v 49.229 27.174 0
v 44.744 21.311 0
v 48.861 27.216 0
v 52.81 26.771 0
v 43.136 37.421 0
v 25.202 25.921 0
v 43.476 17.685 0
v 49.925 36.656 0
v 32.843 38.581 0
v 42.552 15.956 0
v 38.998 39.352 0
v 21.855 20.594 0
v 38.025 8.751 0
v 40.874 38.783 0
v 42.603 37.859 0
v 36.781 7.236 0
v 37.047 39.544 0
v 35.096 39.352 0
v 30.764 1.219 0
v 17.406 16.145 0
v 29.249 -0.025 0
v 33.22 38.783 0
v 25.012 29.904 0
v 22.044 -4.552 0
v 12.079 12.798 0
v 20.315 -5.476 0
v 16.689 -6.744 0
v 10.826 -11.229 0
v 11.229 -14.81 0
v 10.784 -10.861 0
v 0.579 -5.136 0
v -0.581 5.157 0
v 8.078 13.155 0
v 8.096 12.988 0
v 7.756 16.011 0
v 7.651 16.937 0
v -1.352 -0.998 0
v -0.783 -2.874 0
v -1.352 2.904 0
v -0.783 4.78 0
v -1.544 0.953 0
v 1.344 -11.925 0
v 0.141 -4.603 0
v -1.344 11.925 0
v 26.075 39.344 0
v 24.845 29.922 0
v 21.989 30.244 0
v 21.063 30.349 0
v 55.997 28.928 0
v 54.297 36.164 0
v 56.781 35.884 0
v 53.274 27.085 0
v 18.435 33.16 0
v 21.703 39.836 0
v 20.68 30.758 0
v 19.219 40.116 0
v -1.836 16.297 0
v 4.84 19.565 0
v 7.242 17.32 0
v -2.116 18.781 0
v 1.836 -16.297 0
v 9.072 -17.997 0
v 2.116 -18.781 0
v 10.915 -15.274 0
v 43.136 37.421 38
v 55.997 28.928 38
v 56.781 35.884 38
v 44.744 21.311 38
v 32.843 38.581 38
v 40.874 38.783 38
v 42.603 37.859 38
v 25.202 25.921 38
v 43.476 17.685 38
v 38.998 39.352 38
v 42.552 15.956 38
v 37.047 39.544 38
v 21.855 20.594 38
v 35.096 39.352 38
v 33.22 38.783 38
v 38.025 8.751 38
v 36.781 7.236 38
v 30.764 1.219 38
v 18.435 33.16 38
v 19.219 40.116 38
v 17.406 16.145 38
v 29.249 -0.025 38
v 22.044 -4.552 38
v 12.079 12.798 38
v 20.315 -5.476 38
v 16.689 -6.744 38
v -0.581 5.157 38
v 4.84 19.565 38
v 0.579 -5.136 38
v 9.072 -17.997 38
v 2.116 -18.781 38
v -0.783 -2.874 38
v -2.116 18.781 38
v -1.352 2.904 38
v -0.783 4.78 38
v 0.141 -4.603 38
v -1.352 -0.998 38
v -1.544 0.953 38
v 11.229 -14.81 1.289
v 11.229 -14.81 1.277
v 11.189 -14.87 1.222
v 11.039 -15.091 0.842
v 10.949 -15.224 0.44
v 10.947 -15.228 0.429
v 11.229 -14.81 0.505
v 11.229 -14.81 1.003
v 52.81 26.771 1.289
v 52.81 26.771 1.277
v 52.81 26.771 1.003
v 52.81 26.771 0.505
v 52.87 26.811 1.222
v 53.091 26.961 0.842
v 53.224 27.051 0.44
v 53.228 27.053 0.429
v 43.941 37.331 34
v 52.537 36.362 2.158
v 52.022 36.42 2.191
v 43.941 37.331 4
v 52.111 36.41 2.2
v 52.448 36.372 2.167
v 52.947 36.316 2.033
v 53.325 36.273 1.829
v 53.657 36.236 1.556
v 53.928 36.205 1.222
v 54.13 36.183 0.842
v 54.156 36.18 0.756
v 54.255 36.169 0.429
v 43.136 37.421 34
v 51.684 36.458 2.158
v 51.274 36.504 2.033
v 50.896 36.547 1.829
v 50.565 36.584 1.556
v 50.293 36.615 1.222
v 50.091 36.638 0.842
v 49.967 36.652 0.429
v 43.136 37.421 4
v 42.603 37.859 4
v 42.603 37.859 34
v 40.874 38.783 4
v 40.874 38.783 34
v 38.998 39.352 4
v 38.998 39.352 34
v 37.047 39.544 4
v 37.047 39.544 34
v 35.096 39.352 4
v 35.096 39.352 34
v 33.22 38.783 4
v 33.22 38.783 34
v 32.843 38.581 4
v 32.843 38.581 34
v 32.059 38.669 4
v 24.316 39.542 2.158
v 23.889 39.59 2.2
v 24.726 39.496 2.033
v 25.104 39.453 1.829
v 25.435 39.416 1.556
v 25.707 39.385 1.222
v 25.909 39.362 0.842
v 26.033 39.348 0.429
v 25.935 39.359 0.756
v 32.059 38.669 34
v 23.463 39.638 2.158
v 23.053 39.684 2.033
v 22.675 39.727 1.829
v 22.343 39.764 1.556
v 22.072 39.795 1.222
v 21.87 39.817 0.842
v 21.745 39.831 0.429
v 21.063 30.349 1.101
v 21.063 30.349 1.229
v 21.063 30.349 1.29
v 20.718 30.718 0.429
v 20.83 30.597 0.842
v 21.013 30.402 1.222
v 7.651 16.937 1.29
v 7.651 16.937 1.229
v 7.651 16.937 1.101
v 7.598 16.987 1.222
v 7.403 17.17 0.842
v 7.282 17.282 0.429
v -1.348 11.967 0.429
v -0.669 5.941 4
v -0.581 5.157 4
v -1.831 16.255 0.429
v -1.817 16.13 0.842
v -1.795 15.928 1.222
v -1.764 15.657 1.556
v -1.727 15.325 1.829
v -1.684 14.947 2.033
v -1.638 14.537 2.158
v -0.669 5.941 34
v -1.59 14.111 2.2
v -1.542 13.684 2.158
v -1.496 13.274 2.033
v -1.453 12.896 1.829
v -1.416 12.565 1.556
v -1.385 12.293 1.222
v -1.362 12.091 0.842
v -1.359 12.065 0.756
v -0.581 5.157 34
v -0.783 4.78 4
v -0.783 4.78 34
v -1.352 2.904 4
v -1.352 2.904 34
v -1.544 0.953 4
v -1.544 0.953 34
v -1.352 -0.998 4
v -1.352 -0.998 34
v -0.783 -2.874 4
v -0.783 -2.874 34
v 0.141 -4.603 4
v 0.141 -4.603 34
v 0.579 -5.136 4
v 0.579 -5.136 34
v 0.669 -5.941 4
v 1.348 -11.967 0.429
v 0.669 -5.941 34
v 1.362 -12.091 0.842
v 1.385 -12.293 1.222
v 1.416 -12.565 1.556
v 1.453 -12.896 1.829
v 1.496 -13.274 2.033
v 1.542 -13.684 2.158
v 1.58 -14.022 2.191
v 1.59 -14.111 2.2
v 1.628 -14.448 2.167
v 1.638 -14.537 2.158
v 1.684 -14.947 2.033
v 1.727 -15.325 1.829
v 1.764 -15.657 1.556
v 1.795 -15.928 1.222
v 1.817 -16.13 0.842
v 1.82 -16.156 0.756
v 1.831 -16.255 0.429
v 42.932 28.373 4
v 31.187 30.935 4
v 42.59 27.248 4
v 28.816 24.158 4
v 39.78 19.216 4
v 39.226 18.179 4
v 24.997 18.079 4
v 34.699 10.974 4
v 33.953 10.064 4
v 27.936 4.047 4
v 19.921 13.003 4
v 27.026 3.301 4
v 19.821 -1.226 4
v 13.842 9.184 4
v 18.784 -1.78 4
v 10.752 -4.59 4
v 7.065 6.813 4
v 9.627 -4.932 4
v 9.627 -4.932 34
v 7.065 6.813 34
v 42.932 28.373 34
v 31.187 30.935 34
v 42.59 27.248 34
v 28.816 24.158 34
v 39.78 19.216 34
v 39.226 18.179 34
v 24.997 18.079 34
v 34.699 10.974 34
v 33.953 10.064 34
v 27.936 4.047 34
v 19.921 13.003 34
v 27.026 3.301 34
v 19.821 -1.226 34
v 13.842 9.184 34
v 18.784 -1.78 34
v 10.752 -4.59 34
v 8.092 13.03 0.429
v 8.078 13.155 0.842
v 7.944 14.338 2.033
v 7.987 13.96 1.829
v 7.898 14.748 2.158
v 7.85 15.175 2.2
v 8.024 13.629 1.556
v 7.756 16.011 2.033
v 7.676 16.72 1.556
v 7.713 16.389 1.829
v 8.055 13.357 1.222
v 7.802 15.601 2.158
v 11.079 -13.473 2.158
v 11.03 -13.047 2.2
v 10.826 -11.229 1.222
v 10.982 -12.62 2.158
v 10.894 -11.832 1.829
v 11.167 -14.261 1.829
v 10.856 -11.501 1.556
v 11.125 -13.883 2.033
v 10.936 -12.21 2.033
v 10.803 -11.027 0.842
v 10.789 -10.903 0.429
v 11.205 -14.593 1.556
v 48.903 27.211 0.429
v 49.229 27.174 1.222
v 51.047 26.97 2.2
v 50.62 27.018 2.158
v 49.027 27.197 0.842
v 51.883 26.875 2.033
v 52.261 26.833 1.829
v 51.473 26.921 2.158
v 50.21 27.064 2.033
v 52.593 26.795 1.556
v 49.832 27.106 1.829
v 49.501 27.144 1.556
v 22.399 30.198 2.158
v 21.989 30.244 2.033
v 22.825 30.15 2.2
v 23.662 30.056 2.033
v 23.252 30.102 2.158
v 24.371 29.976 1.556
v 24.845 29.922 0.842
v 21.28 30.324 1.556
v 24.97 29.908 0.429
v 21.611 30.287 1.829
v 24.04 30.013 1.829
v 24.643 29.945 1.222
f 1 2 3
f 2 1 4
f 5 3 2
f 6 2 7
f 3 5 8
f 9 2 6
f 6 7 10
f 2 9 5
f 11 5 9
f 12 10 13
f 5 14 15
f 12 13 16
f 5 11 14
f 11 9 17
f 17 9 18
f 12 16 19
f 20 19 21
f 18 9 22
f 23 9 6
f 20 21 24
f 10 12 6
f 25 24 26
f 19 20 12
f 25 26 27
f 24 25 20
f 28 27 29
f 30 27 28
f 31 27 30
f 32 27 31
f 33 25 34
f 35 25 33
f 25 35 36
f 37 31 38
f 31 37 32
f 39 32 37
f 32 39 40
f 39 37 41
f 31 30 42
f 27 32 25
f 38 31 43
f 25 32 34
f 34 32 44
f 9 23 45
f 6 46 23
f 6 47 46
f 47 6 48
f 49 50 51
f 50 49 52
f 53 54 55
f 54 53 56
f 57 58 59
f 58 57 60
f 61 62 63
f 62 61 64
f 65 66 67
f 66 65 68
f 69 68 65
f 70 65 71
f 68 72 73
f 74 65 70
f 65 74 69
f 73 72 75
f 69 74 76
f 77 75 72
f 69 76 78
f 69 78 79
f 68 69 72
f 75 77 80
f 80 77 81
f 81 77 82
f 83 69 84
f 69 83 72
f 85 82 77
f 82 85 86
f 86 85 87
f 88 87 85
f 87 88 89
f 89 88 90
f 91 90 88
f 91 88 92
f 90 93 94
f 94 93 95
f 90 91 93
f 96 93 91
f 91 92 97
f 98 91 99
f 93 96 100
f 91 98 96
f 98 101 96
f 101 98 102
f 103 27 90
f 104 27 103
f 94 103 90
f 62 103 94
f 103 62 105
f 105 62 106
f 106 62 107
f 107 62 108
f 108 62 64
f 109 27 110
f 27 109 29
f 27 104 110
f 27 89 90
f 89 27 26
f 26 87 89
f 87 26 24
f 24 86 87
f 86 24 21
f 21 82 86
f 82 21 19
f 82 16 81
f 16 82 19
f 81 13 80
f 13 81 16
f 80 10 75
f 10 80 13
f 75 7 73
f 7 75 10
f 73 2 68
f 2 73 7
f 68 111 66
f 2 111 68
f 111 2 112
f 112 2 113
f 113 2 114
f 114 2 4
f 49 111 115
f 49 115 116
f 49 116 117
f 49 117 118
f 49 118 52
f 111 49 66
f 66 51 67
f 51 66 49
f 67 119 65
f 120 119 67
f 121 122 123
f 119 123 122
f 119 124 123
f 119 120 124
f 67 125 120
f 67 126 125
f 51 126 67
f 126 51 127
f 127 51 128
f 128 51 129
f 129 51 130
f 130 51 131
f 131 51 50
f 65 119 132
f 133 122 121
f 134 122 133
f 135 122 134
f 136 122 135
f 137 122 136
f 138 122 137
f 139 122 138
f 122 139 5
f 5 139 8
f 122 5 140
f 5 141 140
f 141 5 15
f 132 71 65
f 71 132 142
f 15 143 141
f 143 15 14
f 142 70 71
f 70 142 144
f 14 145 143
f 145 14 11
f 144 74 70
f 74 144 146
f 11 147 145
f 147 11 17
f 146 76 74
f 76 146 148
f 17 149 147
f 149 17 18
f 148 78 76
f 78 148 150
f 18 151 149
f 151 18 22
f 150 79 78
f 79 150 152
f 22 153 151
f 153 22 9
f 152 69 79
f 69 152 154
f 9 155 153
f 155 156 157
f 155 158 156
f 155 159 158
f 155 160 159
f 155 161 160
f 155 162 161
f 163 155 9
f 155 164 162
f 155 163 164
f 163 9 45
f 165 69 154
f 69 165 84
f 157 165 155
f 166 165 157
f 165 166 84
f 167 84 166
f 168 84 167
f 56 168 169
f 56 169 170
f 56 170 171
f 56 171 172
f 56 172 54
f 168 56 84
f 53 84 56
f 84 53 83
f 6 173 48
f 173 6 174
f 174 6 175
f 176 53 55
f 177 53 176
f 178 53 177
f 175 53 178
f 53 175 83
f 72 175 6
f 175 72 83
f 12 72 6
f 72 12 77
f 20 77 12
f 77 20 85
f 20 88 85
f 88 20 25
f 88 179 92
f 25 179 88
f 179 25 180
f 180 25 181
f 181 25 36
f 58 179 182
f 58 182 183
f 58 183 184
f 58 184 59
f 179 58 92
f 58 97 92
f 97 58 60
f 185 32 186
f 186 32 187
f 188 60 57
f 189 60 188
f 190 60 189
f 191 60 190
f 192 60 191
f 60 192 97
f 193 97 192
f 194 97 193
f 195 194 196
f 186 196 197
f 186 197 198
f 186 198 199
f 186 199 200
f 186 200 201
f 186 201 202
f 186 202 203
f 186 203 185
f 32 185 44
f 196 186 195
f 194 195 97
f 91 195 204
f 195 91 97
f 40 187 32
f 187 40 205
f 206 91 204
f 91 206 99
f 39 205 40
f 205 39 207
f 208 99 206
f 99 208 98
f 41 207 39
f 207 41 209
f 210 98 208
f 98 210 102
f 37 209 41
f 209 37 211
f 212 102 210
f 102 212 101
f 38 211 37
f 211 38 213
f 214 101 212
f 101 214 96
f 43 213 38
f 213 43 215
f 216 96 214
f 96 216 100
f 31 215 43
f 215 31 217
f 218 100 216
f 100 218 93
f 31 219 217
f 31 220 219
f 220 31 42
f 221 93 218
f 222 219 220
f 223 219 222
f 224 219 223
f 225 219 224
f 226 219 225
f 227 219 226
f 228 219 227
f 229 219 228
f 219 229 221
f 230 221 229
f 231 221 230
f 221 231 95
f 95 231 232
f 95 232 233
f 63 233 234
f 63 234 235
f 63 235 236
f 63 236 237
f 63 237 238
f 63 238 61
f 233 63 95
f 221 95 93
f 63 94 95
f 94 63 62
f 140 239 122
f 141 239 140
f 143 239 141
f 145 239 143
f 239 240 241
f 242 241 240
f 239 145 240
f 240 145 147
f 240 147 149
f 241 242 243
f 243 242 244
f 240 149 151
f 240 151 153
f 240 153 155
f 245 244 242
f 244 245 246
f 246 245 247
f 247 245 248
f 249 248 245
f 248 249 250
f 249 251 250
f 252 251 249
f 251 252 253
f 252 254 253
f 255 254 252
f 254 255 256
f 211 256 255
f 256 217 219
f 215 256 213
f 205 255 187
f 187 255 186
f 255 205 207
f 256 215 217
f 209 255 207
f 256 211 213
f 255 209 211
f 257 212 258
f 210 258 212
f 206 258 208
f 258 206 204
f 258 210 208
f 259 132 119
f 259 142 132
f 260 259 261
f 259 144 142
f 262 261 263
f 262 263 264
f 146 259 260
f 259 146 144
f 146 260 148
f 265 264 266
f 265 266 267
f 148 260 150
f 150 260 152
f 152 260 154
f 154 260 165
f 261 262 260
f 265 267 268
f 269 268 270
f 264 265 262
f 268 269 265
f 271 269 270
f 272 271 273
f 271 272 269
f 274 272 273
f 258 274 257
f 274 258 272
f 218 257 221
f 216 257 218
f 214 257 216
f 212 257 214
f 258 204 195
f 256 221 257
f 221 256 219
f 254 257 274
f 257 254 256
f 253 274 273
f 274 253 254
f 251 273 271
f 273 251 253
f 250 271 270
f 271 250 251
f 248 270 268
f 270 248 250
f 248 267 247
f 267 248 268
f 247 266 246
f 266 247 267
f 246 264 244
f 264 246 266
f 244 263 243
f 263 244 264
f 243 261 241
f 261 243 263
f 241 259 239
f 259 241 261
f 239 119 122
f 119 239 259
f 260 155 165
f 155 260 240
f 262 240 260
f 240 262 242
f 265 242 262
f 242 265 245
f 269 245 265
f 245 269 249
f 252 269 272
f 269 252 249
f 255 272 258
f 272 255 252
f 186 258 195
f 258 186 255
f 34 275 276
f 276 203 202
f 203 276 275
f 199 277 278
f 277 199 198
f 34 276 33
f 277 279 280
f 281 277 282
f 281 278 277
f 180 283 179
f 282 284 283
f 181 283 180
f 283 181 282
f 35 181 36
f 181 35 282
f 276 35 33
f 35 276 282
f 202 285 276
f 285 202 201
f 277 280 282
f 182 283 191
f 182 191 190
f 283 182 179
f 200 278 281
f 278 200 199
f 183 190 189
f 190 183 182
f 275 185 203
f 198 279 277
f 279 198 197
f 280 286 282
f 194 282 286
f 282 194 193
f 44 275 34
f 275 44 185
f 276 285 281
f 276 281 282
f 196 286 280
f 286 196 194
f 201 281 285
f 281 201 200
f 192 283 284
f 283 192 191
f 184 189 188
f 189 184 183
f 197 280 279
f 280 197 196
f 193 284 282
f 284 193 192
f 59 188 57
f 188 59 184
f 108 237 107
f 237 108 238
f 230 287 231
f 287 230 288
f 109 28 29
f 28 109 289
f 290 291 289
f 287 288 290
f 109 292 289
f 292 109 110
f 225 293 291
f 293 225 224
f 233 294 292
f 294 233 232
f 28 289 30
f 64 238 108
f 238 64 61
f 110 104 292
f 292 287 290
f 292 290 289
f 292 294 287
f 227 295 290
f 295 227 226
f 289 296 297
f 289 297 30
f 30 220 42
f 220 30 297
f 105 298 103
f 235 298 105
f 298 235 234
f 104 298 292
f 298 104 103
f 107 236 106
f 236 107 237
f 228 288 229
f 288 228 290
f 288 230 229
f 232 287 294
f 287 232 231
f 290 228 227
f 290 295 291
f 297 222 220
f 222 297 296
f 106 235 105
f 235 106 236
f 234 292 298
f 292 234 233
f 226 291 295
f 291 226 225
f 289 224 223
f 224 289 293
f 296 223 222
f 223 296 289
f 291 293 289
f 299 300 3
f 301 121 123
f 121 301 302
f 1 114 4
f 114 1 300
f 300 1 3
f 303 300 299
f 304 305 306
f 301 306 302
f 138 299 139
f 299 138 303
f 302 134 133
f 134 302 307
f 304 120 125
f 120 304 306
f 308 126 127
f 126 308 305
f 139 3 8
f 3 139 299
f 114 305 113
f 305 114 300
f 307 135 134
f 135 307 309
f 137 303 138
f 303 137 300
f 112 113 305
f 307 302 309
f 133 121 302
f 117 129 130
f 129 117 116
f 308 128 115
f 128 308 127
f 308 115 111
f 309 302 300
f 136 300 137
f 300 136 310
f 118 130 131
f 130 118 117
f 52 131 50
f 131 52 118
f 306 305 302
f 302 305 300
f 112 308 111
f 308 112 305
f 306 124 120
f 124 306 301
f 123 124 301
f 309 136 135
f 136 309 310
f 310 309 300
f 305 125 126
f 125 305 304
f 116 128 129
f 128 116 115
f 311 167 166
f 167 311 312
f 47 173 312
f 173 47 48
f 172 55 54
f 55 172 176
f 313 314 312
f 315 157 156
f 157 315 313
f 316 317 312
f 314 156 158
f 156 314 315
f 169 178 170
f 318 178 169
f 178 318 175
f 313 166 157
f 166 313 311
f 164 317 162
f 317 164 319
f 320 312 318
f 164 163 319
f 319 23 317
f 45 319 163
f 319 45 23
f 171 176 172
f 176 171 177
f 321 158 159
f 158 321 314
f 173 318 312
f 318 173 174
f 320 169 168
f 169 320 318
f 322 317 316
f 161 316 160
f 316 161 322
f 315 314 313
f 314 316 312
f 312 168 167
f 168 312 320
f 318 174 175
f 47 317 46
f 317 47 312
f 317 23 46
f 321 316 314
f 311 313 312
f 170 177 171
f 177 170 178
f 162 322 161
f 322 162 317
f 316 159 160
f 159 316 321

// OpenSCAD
$fn = 32;

// ----------------------------------------------------------------------
// Air duct: 20 mm duct, 4 mm wall, 38 mm across
// ----------------------------------------------------------------------

// --- parameters (mm) ---
duct_r = 10;              // duct core radius
duct_d = 20;              // duct core diameter
wall = 4;                 // duct wall thickness
height = 38;              // duct width (extrusion height)
port_r = 18.9;            // port flange half width
port_d = 37.8;            // port flange width
port_t = 7;               // port flange thickness
bolt_d = 4.4;             // port bolt holes
bolt_offset = 14.2;       // bolt hole offset from the port axis

difference() {
  /* outer hull chain: tube with a flat flange plate at every port */
  linear_extrude(height = 38) {
    hull() {
      polygon([[2.116, -18.781], [-2.116, 18.781], [4.84, 19.565], [9.072, -17.997]]);
      translate([9.937, 1.12]) circle(r = 10);
    }
    hull() {
      translate([9.937, 1.12]) circle(r = 10);
      translate([8.456, 0.953]) circle(r = 10);
    }
    hull() {
      translate([8.456, 0.953]) circle(r = 10);
      translate([16.488, 3.763]) circle(r = 10);
    }
    hull() {
      translate([16.488, 3.763]) circle(r = 10);
      translate([23.693, 8.29]) circle(r = 10);
    }
    hull() {
      translate([23.693, 8.29]) circle(r = 10);
      translate([29.71, 14.307]) circle(r = 10);
    }
    hull() {
      translate([29.71, 14.307]) circle(r = 10);
      translate([34.237, 21.512]) circle(r = 10);
    }
    hull() {
      translate([34.237, 21.512]) circle(r = 10);
      translate([37.047, 29.544]) circle(r = 10);
    }
    hull() {
      translate([37.047, 29.544]) circle(r = 10);
      translate([36.88, 28.063]) circle(r = 10);
    }
    hull() {
      translate([36.88, 28.063]) circle(r = 10);
      polygon([[19.219, 40.116], [56.781, 35.884], [55.997, 28.928], [18.435, 33.16]]);
    }
  }
  /* air passage: the same chain inset by the wall, 5 mm proud of the ports */
  translate([0, 0, 4]) linear_extrude(height = 30) {
    hull() {
      translate([-4.969, -0.56]) circle(r = 6);
      translate([8.456, 0.953]) circle(r = 6);
    }
    hull() {
      translate([8.456, 0.953]) circle(r = 6);
      translate([16.488, 3.763]) circle(r = 6);
    }
    hull() {
      translate([16.488, 3.763]) circle(r = 6);
      translate([23.693, 8.29]) circle(r = 6);
    }
    hull() {
      translate([23.693, 8.29]) circle(r = 6);
      translate([29.71, 14.307]) circle(r = 6);
    }
    hull() {
      translate([29.71, 14.307]) circle(r = 6);
      translate([34.237, 21.512]) circle(r = 6);
    }
    hull() {
      translate([34.237, 21.512]) circle(r = 6);
      translate([37.047, 29.544]) circle(r = 6);
    }
    hull() {
      translate([37.047, 29.544]) circle(r = 6);
      translate([38.56, 42.969]) circle(r = 6);
    }
  }
  translate([0, 0]) rotate([0, 0, -83.57]) translate([-14.2, -2.5]) rotate([-90, 0, 0]) cylinder(h = 12, d = 4.4);
  translate([0, 0]) rotate([0, 0, -83.57]) translate([14.2, -2.5]) rotate([-90, 0, 0]) cylinder(h = 12, d = 4.4);
  translate([38, 38]) rotate([0, 0, 173.57]) translate([-14.2, -2.5]) rotate([-90, 0, 0]) cylinder(h = 12, d = 4.4);
  translate([38, 38]) rotate([0, 0, 173.57]) translate([14.2, -2.5]) rotate([-90, 0, 0]) cylinder(h = 12, d = 4.4);
}
